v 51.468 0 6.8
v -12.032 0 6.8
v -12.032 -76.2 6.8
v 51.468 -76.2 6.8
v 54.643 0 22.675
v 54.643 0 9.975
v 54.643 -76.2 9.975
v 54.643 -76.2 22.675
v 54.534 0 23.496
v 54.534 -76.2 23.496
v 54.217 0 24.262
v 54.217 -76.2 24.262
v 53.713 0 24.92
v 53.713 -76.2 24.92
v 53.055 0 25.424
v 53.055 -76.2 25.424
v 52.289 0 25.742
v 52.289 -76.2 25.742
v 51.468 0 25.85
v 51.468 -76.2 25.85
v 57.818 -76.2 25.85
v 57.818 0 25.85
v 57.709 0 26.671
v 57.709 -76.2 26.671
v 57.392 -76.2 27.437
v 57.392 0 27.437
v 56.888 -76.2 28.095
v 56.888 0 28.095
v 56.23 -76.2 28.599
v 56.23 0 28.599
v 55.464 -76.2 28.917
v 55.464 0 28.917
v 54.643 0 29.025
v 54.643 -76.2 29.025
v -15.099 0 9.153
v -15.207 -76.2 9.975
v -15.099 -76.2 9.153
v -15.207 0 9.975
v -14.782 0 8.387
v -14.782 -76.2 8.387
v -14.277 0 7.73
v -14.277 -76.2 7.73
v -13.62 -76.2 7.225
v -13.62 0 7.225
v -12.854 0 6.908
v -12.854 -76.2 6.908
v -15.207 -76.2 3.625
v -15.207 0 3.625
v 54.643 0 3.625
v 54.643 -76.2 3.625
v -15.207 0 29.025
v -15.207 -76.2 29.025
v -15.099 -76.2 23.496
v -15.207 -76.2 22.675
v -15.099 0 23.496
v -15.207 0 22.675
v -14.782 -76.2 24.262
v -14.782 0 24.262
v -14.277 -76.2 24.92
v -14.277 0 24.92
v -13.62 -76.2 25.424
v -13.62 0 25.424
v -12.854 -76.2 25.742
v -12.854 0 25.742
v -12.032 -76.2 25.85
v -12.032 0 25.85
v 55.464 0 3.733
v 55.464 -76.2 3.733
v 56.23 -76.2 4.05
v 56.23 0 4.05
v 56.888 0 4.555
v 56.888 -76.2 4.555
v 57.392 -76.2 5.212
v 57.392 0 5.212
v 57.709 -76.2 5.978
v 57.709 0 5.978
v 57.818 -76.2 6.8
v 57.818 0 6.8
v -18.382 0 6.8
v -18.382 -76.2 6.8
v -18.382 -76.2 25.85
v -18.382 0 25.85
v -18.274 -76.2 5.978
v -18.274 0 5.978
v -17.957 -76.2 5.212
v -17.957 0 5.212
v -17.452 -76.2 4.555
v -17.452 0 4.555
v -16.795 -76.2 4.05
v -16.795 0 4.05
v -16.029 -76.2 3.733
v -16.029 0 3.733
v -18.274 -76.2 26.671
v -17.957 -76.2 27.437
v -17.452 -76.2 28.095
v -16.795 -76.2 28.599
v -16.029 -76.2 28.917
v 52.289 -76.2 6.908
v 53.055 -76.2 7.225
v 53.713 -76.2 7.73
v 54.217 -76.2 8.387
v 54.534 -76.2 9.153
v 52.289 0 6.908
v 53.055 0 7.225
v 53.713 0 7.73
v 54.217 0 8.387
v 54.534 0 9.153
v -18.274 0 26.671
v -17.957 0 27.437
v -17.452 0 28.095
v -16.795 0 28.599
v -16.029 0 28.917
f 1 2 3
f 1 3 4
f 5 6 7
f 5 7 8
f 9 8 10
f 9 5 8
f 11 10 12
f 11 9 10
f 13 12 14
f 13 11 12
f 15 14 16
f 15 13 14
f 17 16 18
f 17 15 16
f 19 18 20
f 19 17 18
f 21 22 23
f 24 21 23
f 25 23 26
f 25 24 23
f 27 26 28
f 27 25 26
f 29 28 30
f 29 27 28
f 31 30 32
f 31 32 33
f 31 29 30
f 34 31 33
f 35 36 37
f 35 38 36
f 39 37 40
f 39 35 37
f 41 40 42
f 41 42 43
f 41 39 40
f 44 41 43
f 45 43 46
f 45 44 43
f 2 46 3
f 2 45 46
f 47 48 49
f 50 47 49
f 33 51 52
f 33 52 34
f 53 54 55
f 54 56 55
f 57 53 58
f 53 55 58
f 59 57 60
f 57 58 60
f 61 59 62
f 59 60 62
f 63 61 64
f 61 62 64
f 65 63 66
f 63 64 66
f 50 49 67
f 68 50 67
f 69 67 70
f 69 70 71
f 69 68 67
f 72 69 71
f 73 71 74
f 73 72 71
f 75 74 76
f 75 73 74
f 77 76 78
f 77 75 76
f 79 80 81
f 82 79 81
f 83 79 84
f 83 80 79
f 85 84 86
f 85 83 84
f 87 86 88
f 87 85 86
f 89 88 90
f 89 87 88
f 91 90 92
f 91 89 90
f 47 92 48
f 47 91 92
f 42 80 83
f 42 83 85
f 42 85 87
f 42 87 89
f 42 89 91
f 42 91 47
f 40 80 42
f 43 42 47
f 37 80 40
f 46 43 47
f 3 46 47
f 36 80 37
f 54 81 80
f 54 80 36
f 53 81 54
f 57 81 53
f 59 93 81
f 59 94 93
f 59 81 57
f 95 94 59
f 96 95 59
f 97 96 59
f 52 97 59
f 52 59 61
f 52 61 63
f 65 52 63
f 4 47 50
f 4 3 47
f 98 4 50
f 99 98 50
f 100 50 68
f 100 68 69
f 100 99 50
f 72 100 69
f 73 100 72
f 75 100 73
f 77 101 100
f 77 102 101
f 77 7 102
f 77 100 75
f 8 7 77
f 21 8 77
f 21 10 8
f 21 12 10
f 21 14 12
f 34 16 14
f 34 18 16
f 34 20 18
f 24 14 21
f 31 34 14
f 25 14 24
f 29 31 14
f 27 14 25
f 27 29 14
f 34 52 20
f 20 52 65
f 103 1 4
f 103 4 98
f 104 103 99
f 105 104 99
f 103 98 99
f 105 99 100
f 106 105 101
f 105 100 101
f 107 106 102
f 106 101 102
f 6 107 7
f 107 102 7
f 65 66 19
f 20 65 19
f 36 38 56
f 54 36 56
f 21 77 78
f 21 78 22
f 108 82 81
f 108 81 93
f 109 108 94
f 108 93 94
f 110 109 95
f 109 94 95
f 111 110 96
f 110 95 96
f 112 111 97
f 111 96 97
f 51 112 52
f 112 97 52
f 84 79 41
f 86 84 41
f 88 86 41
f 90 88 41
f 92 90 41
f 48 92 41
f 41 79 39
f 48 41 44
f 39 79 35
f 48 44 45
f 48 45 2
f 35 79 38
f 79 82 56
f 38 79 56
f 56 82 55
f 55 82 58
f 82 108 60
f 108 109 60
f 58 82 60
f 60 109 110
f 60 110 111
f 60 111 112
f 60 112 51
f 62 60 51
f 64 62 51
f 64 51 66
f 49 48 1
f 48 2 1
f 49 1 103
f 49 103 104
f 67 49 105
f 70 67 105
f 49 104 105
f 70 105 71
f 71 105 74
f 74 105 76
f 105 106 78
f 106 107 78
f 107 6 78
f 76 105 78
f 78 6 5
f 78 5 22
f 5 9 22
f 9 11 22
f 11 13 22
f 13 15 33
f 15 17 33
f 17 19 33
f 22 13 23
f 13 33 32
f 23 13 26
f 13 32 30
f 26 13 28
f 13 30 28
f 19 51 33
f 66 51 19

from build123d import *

# Parameters (mm, degrees)
F0_W     = 76.2
F0_H     = 25.4
F1_DEPTH = 76.2
F2_T     = -3.175
F3_R     = 3.175


with BuildPart() as f1:
    # F0 (on Front) → F1 (new body)
    with BuildSketch(Plane.XZ):
        with Locations((19.7176617778, 16.3246961311)):
            Rectangle(F0_W, F0_H)
    extrude(amount=F1_DEPTH)

    # F2
    f2_openings = [f1.faces().sort_by_distance(p)[0] for p in [
        (19.717662, -76.2, 16.324696),
        (19.717662, 0, 16.324696),
    ]]
    offset(amount=F2_T, openings=f2_openings)

    # F3
    f3_edges = [f1.edges().sort_by_distance(p)[0] for p in [
        (-18.382338, -38.1, 29.024696),
        (-15.207338, -38.1, 25.849696),
        (-15.207338, -38.1, 6.799696),
        (54.642662, -38.1, 6.799696),
        (54.642662, -38.1, 25.849696),
        (-18.382338, -38.1, 3.624696),
        (57.817662, -38.1, 29.024696),
        (57.817662, -38.1, 3.624696),
    ]]
    fillet(f3_edges, radius=F3_R)


solid = f1.part
